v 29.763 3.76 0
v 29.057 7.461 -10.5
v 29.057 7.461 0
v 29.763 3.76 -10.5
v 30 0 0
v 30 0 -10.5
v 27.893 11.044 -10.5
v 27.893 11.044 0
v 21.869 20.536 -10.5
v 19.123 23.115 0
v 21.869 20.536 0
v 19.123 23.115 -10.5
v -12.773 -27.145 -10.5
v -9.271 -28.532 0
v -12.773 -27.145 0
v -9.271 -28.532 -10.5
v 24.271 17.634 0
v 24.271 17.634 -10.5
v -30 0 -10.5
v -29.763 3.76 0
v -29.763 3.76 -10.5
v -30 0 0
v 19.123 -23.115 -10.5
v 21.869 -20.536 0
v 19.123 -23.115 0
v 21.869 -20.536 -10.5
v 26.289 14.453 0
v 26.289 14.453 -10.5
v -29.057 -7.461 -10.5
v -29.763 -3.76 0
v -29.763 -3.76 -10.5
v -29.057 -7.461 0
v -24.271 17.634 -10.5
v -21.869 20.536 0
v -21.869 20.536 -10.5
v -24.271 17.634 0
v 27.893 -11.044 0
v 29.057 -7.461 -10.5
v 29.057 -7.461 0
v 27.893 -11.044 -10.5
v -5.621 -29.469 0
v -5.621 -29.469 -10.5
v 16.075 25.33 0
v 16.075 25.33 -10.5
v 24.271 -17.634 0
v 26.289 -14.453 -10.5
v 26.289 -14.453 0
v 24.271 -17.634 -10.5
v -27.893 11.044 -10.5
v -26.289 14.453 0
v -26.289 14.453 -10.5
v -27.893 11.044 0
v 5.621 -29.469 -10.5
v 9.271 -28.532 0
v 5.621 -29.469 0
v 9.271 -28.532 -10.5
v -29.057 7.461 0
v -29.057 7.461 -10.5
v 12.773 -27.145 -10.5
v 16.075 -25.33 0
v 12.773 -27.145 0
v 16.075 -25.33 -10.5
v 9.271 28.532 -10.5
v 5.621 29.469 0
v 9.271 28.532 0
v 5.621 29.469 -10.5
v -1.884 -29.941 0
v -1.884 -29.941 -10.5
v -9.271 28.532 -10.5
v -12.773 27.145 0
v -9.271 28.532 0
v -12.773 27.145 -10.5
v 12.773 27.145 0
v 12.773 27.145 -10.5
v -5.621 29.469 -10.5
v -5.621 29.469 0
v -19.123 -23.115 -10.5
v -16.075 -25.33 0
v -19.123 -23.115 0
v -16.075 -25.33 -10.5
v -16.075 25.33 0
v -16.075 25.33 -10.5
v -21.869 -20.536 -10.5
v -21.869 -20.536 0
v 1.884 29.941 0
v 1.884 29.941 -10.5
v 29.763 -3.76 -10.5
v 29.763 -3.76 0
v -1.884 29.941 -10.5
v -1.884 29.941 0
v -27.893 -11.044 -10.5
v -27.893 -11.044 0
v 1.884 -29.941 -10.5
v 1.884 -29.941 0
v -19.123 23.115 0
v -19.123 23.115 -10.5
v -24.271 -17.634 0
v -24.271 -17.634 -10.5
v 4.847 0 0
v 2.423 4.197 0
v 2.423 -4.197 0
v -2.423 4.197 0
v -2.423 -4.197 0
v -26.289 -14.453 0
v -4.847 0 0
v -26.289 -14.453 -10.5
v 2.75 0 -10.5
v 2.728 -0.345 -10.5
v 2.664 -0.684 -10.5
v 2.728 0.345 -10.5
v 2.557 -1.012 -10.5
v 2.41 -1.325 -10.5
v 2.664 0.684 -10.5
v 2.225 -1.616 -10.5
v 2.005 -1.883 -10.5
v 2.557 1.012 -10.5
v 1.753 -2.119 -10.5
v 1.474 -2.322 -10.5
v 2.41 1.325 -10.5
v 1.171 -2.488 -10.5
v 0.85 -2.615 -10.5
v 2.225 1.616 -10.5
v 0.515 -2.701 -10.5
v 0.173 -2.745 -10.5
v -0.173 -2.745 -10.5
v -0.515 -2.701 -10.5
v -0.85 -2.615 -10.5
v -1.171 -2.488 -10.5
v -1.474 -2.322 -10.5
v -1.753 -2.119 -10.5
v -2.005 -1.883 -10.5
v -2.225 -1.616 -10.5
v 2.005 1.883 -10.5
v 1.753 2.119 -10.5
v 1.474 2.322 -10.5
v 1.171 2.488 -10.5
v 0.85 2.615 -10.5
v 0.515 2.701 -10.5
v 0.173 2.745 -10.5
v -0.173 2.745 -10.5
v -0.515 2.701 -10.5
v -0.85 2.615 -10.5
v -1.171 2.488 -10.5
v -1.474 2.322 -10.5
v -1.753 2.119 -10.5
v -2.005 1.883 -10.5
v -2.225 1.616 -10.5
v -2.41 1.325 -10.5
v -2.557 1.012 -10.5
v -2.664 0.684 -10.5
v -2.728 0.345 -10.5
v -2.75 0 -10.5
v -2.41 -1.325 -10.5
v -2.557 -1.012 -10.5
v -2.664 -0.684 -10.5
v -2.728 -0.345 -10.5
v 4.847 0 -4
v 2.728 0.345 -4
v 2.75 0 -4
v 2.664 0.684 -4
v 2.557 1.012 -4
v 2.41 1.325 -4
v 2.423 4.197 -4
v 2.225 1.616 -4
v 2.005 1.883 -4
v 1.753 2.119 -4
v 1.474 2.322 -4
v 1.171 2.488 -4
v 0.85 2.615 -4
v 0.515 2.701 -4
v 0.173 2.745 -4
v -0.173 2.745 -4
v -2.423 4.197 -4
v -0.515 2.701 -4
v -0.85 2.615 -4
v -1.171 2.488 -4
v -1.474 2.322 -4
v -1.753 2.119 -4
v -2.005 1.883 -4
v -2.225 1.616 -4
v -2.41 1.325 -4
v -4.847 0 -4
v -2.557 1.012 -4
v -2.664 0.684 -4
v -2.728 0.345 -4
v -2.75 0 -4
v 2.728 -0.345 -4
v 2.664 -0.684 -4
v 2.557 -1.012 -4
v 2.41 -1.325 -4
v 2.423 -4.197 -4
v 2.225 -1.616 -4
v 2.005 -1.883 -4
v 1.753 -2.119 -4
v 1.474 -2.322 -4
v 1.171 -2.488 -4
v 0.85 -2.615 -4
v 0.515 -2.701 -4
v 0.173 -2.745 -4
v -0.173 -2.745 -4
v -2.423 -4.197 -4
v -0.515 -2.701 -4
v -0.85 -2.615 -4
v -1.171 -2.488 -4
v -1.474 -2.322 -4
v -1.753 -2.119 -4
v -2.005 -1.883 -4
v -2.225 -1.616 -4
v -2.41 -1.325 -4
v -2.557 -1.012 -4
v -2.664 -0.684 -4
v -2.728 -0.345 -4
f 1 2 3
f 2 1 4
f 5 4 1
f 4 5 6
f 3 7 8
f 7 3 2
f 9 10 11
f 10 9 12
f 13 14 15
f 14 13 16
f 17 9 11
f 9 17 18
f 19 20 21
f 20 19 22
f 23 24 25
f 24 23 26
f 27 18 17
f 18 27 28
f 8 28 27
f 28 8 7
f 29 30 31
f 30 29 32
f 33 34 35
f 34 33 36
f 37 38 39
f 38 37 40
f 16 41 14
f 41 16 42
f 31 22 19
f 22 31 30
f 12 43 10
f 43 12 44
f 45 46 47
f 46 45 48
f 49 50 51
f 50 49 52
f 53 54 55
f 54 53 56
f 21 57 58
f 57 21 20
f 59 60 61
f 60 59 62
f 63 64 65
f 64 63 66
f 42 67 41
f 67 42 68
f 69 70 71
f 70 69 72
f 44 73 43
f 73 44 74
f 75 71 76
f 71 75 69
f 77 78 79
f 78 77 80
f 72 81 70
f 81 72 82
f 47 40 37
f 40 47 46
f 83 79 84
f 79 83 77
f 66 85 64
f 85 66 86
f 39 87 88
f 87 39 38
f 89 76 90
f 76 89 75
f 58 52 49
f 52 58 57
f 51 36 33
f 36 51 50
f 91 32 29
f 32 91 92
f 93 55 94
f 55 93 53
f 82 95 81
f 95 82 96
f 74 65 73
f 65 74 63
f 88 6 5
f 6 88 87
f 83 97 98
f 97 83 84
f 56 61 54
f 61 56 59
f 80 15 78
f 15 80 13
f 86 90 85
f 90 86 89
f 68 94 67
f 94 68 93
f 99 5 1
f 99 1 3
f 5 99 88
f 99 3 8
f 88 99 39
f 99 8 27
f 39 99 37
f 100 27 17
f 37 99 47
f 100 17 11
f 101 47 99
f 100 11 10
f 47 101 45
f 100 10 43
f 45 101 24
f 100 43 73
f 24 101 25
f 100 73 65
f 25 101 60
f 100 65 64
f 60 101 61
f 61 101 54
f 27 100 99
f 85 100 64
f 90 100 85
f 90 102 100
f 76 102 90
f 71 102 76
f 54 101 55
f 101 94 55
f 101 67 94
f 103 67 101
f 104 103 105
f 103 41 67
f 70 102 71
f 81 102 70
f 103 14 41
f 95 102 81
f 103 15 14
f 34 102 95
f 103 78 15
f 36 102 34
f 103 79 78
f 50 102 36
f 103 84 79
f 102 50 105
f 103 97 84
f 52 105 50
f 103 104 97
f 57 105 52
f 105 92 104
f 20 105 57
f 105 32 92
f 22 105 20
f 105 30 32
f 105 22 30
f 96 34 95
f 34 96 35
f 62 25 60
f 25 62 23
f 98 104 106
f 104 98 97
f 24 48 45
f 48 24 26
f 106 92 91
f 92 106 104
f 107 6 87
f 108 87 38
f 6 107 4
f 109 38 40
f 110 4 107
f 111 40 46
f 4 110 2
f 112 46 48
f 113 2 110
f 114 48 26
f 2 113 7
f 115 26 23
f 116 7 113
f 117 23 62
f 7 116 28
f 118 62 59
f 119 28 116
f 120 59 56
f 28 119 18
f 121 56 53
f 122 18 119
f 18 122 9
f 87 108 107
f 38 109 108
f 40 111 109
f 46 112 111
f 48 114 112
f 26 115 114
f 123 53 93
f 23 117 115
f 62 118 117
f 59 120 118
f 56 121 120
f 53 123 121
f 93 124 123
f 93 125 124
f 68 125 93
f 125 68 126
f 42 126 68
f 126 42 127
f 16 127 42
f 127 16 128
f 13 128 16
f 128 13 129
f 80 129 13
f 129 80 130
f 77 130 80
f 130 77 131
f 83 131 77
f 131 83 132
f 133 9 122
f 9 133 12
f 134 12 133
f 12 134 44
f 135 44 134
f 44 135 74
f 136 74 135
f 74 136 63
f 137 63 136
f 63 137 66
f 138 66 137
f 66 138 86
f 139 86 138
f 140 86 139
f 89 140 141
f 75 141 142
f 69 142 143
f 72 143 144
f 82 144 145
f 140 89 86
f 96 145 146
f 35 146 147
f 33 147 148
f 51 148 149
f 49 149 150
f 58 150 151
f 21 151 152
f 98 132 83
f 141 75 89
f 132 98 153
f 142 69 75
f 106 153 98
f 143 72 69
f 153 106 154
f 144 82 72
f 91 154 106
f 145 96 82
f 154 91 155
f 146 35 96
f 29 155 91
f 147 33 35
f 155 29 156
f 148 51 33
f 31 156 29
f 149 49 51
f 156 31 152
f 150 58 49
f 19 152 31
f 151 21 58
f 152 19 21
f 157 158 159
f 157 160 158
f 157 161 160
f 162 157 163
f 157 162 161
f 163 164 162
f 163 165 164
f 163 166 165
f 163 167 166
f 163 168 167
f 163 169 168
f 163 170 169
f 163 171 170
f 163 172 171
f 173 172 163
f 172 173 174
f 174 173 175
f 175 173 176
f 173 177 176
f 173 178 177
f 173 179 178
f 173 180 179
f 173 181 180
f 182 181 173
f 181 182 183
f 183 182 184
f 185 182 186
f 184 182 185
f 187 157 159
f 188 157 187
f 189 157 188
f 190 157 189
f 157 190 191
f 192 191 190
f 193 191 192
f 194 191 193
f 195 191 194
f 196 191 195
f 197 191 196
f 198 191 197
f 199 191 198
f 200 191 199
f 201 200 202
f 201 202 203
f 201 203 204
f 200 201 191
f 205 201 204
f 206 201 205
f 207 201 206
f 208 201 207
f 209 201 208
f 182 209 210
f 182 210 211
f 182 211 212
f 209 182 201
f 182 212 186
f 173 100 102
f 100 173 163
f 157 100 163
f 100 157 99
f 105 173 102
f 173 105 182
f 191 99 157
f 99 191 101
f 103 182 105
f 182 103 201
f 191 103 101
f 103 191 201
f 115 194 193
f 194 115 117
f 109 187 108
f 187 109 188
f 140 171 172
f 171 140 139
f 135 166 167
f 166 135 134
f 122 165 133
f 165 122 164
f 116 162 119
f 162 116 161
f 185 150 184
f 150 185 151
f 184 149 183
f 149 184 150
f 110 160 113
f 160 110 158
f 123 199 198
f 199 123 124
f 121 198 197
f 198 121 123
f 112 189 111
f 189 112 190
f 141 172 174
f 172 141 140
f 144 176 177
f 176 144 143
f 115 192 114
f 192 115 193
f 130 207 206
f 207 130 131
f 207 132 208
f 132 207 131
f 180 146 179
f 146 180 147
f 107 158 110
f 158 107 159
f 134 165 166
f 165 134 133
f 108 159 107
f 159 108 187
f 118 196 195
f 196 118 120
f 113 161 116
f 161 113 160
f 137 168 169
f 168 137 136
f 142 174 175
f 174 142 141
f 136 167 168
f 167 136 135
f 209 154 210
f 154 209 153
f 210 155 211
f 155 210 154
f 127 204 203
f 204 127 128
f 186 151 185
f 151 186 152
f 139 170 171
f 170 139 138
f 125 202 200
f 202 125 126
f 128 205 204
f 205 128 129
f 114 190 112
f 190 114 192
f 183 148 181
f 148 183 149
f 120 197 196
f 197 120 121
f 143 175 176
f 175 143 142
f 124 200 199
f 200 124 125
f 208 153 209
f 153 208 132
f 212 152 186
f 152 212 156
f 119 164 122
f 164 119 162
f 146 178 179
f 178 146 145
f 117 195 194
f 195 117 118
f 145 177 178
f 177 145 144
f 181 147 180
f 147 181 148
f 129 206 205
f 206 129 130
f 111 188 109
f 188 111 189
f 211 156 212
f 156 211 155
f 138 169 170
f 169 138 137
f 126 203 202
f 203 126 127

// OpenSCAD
$fn = 50;


difference() {
	union() {
		translate(v = [0, 0, -10.5000000000]) {
			cylinder(h = 10.5000000000, r = 30.0000000000);
		}
		translate(v = [0, 0, -9.0000000000]) {
			cylinder(h = 9, r = 2.8750000000);
		}
	}
	union() {
		translate(v = [0, 0, 0]) {
			rotate(a = [0, 0, 0]) {
				difference() {
					union() {
						translate(v = [0, 0, -4]) {
							linear_extrude(height = 4) {
								polygon(points = [[4.8468000000, 0.0000000000], [2.4234000000, 4.1974519271], [-2.4234000000, 4.1974519271], [-4.8468000000, 0.0000000000], [-2.4234000000, -4.1974519271], [2.4234000000, -4.1974519271]]);
							}
						}
					}
					union();
				}
			}
		}
		#translate(v = [0, 0, -100.0000000000]) {
			cylinder(h = 200, r = 2.7500000000);
		}
	}
}
